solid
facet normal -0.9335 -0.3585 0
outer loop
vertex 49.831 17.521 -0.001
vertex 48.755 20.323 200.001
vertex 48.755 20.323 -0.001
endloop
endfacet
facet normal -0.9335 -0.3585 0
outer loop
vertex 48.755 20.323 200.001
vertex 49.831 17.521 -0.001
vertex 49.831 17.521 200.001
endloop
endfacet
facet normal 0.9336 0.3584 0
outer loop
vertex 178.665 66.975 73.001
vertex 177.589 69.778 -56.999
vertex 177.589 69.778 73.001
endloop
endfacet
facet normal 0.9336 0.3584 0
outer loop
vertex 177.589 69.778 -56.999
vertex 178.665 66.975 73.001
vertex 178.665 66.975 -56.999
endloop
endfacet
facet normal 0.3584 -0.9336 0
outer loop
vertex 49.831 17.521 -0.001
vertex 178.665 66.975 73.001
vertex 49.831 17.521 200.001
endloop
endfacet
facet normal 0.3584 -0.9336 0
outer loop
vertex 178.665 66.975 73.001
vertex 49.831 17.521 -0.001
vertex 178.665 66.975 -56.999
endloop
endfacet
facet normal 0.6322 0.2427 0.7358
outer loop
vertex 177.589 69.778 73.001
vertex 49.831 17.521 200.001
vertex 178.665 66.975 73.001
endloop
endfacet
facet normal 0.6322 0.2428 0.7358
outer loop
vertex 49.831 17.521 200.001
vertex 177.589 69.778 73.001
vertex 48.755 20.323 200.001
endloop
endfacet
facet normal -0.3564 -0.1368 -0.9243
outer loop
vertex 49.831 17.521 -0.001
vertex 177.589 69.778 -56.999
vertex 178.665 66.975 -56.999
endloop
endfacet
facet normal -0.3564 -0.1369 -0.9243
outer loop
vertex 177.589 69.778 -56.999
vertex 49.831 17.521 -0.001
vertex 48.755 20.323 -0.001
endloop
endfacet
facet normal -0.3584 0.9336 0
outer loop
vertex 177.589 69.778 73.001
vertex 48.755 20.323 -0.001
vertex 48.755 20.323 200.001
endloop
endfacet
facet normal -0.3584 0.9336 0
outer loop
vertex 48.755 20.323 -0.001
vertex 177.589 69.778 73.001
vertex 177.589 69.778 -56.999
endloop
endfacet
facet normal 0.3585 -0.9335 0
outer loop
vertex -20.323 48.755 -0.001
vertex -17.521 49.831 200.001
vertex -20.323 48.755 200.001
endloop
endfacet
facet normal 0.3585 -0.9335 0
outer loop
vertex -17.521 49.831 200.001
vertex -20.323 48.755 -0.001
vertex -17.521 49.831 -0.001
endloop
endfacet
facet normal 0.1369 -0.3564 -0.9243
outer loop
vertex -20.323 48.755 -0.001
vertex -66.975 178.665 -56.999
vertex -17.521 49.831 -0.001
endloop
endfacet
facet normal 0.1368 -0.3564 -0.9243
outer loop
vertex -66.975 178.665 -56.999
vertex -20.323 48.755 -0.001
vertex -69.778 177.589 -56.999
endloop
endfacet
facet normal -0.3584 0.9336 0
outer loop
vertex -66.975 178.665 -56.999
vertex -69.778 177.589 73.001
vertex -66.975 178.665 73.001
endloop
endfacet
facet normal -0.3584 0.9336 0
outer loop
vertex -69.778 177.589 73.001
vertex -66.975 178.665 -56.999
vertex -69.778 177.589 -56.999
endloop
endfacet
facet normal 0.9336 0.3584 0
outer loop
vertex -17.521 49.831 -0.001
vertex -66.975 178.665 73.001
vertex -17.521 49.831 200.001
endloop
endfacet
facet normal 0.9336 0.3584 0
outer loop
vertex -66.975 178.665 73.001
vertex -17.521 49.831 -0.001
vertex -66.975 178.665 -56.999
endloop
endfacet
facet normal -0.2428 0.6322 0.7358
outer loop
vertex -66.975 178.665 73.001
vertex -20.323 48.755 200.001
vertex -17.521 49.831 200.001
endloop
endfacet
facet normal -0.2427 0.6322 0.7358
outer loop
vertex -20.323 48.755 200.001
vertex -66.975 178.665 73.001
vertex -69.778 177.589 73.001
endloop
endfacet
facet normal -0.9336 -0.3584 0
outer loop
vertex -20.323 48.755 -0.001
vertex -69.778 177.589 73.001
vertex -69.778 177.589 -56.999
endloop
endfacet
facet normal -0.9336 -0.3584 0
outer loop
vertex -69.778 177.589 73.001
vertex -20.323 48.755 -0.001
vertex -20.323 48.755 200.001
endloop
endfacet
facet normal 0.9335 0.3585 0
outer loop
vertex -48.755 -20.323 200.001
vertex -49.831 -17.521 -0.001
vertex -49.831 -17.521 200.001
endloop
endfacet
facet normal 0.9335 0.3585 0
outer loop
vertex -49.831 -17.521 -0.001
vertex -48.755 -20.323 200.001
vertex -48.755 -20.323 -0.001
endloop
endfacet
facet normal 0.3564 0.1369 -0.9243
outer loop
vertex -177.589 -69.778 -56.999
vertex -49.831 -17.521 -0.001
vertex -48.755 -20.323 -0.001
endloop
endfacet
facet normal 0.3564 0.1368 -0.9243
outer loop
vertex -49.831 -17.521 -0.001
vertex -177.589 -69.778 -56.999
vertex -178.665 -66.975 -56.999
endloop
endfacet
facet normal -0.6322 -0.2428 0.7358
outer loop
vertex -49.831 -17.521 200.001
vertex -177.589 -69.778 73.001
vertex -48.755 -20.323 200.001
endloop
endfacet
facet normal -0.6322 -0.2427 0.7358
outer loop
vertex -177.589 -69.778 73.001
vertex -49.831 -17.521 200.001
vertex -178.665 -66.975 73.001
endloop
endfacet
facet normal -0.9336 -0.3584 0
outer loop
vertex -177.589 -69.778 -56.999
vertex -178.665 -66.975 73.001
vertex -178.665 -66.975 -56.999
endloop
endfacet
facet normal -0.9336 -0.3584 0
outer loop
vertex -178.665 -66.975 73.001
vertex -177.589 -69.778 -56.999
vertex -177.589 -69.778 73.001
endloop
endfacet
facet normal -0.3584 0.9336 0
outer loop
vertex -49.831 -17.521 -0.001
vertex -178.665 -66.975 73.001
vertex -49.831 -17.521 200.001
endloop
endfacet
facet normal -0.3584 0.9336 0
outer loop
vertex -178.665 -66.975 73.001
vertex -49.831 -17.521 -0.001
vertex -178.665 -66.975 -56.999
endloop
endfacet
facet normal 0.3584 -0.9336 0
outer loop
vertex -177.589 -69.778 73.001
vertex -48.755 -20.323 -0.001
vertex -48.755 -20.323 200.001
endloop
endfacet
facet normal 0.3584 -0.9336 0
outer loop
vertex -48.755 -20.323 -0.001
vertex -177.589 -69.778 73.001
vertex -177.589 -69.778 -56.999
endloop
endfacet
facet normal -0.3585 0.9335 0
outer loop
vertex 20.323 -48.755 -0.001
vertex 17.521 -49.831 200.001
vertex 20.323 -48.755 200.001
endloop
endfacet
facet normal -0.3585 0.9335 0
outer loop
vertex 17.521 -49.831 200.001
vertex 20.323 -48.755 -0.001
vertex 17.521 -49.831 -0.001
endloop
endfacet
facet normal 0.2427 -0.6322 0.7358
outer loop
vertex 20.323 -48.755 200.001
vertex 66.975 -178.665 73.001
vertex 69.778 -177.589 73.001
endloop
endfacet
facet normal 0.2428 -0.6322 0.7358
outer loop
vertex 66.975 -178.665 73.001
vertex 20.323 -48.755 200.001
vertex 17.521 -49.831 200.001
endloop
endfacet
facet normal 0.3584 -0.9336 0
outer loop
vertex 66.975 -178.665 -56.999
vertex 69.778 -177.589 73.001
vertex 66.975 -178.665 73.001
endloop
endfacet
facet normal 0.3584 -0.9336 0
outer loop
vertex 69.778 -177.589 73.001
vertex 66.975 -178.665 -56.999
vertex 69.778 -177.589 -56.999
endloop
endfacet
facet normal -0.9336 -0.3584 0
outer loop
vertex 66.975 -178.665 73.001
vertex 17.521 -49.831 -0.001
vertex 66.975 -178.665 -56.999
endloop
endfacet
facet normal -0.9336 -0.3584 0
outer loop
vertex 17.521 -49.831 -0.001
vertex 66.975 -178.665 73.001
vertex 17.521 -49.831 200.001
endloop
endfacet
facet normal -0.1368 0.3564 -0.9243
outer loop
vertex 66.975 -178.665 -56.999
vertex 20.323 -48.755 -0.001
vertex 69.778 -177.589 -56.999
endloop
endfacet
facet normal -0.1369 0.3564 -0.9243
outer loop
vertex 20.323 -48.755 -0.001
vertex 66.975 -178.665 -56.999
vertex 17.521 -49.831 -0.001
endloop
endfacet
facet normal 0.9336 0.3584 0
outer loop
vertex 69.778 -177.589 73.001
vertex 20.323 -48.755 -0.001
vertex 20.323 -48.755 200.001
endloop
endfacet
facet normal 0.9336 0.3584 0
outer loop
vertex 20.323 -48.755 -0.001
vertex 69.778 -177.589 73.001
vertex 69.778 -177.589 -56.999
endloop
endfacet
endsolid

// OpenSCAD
// file: wing.scad
include <config.scad>;

module wing() {
     polyhedron([
                     [0,       0,                                     0],                       // 0
                     [wings_E, 0, 0.002 + wings_m - (wings_p + wings_n)],                       // 1
                     [wings_E, 0, 0.002 + wings_m - wings_p],                                   // 2
                     [0,       0, 0.002 + wings_m],                                             // 3

                     [0,       wings_thickness + 0.002, 0],                                     // 4
                     [wings_E, wings_thickness + 0.002, 0.002 + wings_m - (wings_p + wings_n)], // 5
                     [wings_E, wings_thickness + 0.002, 0.002 + wings_m - wings_p],             // 6
                     [0,       wings_thickness + 0.002, 0.002 + wings_m]],                      // 7
                [
                     [0, 4, 7, 3],   // rear
                     [0, 3, 2, 1],   // left
                     [0, 1, 5, 4],   // bottom
                     [4, 5, 6, 7],   // right
                     [2, 3, 7, 6],   // top
                     [1, 2, 6, 5]]); // front
}

wing();
// file: config.scad
$fn = 160;

body_height = 1800;
skin_int_dia = 110;

wings_thickness = 3;
wings_nb = 4;
wings_rot_offset = 21;
wings_m = 200;
wings_n = 130;
wings_p = 127;
wings_E = 138;

ring_ext_dia = skin_int_dia - 0.4;
// main file
include <config.scad>;

use <wing.scad>;

module wings() {
     n = wings_nb;

     for (i = [0:n]) {
          rotate([0, 0, i * 360 / n + wings_rot_offset]) {
               translate([ring_ext_dia/2 - 2, 0, 0]) {
                    translate([0, -wings_thickness/2 - 0.001, -0.001]) {
                         wing();
                    }
               }
          }
     }
}

wings();
